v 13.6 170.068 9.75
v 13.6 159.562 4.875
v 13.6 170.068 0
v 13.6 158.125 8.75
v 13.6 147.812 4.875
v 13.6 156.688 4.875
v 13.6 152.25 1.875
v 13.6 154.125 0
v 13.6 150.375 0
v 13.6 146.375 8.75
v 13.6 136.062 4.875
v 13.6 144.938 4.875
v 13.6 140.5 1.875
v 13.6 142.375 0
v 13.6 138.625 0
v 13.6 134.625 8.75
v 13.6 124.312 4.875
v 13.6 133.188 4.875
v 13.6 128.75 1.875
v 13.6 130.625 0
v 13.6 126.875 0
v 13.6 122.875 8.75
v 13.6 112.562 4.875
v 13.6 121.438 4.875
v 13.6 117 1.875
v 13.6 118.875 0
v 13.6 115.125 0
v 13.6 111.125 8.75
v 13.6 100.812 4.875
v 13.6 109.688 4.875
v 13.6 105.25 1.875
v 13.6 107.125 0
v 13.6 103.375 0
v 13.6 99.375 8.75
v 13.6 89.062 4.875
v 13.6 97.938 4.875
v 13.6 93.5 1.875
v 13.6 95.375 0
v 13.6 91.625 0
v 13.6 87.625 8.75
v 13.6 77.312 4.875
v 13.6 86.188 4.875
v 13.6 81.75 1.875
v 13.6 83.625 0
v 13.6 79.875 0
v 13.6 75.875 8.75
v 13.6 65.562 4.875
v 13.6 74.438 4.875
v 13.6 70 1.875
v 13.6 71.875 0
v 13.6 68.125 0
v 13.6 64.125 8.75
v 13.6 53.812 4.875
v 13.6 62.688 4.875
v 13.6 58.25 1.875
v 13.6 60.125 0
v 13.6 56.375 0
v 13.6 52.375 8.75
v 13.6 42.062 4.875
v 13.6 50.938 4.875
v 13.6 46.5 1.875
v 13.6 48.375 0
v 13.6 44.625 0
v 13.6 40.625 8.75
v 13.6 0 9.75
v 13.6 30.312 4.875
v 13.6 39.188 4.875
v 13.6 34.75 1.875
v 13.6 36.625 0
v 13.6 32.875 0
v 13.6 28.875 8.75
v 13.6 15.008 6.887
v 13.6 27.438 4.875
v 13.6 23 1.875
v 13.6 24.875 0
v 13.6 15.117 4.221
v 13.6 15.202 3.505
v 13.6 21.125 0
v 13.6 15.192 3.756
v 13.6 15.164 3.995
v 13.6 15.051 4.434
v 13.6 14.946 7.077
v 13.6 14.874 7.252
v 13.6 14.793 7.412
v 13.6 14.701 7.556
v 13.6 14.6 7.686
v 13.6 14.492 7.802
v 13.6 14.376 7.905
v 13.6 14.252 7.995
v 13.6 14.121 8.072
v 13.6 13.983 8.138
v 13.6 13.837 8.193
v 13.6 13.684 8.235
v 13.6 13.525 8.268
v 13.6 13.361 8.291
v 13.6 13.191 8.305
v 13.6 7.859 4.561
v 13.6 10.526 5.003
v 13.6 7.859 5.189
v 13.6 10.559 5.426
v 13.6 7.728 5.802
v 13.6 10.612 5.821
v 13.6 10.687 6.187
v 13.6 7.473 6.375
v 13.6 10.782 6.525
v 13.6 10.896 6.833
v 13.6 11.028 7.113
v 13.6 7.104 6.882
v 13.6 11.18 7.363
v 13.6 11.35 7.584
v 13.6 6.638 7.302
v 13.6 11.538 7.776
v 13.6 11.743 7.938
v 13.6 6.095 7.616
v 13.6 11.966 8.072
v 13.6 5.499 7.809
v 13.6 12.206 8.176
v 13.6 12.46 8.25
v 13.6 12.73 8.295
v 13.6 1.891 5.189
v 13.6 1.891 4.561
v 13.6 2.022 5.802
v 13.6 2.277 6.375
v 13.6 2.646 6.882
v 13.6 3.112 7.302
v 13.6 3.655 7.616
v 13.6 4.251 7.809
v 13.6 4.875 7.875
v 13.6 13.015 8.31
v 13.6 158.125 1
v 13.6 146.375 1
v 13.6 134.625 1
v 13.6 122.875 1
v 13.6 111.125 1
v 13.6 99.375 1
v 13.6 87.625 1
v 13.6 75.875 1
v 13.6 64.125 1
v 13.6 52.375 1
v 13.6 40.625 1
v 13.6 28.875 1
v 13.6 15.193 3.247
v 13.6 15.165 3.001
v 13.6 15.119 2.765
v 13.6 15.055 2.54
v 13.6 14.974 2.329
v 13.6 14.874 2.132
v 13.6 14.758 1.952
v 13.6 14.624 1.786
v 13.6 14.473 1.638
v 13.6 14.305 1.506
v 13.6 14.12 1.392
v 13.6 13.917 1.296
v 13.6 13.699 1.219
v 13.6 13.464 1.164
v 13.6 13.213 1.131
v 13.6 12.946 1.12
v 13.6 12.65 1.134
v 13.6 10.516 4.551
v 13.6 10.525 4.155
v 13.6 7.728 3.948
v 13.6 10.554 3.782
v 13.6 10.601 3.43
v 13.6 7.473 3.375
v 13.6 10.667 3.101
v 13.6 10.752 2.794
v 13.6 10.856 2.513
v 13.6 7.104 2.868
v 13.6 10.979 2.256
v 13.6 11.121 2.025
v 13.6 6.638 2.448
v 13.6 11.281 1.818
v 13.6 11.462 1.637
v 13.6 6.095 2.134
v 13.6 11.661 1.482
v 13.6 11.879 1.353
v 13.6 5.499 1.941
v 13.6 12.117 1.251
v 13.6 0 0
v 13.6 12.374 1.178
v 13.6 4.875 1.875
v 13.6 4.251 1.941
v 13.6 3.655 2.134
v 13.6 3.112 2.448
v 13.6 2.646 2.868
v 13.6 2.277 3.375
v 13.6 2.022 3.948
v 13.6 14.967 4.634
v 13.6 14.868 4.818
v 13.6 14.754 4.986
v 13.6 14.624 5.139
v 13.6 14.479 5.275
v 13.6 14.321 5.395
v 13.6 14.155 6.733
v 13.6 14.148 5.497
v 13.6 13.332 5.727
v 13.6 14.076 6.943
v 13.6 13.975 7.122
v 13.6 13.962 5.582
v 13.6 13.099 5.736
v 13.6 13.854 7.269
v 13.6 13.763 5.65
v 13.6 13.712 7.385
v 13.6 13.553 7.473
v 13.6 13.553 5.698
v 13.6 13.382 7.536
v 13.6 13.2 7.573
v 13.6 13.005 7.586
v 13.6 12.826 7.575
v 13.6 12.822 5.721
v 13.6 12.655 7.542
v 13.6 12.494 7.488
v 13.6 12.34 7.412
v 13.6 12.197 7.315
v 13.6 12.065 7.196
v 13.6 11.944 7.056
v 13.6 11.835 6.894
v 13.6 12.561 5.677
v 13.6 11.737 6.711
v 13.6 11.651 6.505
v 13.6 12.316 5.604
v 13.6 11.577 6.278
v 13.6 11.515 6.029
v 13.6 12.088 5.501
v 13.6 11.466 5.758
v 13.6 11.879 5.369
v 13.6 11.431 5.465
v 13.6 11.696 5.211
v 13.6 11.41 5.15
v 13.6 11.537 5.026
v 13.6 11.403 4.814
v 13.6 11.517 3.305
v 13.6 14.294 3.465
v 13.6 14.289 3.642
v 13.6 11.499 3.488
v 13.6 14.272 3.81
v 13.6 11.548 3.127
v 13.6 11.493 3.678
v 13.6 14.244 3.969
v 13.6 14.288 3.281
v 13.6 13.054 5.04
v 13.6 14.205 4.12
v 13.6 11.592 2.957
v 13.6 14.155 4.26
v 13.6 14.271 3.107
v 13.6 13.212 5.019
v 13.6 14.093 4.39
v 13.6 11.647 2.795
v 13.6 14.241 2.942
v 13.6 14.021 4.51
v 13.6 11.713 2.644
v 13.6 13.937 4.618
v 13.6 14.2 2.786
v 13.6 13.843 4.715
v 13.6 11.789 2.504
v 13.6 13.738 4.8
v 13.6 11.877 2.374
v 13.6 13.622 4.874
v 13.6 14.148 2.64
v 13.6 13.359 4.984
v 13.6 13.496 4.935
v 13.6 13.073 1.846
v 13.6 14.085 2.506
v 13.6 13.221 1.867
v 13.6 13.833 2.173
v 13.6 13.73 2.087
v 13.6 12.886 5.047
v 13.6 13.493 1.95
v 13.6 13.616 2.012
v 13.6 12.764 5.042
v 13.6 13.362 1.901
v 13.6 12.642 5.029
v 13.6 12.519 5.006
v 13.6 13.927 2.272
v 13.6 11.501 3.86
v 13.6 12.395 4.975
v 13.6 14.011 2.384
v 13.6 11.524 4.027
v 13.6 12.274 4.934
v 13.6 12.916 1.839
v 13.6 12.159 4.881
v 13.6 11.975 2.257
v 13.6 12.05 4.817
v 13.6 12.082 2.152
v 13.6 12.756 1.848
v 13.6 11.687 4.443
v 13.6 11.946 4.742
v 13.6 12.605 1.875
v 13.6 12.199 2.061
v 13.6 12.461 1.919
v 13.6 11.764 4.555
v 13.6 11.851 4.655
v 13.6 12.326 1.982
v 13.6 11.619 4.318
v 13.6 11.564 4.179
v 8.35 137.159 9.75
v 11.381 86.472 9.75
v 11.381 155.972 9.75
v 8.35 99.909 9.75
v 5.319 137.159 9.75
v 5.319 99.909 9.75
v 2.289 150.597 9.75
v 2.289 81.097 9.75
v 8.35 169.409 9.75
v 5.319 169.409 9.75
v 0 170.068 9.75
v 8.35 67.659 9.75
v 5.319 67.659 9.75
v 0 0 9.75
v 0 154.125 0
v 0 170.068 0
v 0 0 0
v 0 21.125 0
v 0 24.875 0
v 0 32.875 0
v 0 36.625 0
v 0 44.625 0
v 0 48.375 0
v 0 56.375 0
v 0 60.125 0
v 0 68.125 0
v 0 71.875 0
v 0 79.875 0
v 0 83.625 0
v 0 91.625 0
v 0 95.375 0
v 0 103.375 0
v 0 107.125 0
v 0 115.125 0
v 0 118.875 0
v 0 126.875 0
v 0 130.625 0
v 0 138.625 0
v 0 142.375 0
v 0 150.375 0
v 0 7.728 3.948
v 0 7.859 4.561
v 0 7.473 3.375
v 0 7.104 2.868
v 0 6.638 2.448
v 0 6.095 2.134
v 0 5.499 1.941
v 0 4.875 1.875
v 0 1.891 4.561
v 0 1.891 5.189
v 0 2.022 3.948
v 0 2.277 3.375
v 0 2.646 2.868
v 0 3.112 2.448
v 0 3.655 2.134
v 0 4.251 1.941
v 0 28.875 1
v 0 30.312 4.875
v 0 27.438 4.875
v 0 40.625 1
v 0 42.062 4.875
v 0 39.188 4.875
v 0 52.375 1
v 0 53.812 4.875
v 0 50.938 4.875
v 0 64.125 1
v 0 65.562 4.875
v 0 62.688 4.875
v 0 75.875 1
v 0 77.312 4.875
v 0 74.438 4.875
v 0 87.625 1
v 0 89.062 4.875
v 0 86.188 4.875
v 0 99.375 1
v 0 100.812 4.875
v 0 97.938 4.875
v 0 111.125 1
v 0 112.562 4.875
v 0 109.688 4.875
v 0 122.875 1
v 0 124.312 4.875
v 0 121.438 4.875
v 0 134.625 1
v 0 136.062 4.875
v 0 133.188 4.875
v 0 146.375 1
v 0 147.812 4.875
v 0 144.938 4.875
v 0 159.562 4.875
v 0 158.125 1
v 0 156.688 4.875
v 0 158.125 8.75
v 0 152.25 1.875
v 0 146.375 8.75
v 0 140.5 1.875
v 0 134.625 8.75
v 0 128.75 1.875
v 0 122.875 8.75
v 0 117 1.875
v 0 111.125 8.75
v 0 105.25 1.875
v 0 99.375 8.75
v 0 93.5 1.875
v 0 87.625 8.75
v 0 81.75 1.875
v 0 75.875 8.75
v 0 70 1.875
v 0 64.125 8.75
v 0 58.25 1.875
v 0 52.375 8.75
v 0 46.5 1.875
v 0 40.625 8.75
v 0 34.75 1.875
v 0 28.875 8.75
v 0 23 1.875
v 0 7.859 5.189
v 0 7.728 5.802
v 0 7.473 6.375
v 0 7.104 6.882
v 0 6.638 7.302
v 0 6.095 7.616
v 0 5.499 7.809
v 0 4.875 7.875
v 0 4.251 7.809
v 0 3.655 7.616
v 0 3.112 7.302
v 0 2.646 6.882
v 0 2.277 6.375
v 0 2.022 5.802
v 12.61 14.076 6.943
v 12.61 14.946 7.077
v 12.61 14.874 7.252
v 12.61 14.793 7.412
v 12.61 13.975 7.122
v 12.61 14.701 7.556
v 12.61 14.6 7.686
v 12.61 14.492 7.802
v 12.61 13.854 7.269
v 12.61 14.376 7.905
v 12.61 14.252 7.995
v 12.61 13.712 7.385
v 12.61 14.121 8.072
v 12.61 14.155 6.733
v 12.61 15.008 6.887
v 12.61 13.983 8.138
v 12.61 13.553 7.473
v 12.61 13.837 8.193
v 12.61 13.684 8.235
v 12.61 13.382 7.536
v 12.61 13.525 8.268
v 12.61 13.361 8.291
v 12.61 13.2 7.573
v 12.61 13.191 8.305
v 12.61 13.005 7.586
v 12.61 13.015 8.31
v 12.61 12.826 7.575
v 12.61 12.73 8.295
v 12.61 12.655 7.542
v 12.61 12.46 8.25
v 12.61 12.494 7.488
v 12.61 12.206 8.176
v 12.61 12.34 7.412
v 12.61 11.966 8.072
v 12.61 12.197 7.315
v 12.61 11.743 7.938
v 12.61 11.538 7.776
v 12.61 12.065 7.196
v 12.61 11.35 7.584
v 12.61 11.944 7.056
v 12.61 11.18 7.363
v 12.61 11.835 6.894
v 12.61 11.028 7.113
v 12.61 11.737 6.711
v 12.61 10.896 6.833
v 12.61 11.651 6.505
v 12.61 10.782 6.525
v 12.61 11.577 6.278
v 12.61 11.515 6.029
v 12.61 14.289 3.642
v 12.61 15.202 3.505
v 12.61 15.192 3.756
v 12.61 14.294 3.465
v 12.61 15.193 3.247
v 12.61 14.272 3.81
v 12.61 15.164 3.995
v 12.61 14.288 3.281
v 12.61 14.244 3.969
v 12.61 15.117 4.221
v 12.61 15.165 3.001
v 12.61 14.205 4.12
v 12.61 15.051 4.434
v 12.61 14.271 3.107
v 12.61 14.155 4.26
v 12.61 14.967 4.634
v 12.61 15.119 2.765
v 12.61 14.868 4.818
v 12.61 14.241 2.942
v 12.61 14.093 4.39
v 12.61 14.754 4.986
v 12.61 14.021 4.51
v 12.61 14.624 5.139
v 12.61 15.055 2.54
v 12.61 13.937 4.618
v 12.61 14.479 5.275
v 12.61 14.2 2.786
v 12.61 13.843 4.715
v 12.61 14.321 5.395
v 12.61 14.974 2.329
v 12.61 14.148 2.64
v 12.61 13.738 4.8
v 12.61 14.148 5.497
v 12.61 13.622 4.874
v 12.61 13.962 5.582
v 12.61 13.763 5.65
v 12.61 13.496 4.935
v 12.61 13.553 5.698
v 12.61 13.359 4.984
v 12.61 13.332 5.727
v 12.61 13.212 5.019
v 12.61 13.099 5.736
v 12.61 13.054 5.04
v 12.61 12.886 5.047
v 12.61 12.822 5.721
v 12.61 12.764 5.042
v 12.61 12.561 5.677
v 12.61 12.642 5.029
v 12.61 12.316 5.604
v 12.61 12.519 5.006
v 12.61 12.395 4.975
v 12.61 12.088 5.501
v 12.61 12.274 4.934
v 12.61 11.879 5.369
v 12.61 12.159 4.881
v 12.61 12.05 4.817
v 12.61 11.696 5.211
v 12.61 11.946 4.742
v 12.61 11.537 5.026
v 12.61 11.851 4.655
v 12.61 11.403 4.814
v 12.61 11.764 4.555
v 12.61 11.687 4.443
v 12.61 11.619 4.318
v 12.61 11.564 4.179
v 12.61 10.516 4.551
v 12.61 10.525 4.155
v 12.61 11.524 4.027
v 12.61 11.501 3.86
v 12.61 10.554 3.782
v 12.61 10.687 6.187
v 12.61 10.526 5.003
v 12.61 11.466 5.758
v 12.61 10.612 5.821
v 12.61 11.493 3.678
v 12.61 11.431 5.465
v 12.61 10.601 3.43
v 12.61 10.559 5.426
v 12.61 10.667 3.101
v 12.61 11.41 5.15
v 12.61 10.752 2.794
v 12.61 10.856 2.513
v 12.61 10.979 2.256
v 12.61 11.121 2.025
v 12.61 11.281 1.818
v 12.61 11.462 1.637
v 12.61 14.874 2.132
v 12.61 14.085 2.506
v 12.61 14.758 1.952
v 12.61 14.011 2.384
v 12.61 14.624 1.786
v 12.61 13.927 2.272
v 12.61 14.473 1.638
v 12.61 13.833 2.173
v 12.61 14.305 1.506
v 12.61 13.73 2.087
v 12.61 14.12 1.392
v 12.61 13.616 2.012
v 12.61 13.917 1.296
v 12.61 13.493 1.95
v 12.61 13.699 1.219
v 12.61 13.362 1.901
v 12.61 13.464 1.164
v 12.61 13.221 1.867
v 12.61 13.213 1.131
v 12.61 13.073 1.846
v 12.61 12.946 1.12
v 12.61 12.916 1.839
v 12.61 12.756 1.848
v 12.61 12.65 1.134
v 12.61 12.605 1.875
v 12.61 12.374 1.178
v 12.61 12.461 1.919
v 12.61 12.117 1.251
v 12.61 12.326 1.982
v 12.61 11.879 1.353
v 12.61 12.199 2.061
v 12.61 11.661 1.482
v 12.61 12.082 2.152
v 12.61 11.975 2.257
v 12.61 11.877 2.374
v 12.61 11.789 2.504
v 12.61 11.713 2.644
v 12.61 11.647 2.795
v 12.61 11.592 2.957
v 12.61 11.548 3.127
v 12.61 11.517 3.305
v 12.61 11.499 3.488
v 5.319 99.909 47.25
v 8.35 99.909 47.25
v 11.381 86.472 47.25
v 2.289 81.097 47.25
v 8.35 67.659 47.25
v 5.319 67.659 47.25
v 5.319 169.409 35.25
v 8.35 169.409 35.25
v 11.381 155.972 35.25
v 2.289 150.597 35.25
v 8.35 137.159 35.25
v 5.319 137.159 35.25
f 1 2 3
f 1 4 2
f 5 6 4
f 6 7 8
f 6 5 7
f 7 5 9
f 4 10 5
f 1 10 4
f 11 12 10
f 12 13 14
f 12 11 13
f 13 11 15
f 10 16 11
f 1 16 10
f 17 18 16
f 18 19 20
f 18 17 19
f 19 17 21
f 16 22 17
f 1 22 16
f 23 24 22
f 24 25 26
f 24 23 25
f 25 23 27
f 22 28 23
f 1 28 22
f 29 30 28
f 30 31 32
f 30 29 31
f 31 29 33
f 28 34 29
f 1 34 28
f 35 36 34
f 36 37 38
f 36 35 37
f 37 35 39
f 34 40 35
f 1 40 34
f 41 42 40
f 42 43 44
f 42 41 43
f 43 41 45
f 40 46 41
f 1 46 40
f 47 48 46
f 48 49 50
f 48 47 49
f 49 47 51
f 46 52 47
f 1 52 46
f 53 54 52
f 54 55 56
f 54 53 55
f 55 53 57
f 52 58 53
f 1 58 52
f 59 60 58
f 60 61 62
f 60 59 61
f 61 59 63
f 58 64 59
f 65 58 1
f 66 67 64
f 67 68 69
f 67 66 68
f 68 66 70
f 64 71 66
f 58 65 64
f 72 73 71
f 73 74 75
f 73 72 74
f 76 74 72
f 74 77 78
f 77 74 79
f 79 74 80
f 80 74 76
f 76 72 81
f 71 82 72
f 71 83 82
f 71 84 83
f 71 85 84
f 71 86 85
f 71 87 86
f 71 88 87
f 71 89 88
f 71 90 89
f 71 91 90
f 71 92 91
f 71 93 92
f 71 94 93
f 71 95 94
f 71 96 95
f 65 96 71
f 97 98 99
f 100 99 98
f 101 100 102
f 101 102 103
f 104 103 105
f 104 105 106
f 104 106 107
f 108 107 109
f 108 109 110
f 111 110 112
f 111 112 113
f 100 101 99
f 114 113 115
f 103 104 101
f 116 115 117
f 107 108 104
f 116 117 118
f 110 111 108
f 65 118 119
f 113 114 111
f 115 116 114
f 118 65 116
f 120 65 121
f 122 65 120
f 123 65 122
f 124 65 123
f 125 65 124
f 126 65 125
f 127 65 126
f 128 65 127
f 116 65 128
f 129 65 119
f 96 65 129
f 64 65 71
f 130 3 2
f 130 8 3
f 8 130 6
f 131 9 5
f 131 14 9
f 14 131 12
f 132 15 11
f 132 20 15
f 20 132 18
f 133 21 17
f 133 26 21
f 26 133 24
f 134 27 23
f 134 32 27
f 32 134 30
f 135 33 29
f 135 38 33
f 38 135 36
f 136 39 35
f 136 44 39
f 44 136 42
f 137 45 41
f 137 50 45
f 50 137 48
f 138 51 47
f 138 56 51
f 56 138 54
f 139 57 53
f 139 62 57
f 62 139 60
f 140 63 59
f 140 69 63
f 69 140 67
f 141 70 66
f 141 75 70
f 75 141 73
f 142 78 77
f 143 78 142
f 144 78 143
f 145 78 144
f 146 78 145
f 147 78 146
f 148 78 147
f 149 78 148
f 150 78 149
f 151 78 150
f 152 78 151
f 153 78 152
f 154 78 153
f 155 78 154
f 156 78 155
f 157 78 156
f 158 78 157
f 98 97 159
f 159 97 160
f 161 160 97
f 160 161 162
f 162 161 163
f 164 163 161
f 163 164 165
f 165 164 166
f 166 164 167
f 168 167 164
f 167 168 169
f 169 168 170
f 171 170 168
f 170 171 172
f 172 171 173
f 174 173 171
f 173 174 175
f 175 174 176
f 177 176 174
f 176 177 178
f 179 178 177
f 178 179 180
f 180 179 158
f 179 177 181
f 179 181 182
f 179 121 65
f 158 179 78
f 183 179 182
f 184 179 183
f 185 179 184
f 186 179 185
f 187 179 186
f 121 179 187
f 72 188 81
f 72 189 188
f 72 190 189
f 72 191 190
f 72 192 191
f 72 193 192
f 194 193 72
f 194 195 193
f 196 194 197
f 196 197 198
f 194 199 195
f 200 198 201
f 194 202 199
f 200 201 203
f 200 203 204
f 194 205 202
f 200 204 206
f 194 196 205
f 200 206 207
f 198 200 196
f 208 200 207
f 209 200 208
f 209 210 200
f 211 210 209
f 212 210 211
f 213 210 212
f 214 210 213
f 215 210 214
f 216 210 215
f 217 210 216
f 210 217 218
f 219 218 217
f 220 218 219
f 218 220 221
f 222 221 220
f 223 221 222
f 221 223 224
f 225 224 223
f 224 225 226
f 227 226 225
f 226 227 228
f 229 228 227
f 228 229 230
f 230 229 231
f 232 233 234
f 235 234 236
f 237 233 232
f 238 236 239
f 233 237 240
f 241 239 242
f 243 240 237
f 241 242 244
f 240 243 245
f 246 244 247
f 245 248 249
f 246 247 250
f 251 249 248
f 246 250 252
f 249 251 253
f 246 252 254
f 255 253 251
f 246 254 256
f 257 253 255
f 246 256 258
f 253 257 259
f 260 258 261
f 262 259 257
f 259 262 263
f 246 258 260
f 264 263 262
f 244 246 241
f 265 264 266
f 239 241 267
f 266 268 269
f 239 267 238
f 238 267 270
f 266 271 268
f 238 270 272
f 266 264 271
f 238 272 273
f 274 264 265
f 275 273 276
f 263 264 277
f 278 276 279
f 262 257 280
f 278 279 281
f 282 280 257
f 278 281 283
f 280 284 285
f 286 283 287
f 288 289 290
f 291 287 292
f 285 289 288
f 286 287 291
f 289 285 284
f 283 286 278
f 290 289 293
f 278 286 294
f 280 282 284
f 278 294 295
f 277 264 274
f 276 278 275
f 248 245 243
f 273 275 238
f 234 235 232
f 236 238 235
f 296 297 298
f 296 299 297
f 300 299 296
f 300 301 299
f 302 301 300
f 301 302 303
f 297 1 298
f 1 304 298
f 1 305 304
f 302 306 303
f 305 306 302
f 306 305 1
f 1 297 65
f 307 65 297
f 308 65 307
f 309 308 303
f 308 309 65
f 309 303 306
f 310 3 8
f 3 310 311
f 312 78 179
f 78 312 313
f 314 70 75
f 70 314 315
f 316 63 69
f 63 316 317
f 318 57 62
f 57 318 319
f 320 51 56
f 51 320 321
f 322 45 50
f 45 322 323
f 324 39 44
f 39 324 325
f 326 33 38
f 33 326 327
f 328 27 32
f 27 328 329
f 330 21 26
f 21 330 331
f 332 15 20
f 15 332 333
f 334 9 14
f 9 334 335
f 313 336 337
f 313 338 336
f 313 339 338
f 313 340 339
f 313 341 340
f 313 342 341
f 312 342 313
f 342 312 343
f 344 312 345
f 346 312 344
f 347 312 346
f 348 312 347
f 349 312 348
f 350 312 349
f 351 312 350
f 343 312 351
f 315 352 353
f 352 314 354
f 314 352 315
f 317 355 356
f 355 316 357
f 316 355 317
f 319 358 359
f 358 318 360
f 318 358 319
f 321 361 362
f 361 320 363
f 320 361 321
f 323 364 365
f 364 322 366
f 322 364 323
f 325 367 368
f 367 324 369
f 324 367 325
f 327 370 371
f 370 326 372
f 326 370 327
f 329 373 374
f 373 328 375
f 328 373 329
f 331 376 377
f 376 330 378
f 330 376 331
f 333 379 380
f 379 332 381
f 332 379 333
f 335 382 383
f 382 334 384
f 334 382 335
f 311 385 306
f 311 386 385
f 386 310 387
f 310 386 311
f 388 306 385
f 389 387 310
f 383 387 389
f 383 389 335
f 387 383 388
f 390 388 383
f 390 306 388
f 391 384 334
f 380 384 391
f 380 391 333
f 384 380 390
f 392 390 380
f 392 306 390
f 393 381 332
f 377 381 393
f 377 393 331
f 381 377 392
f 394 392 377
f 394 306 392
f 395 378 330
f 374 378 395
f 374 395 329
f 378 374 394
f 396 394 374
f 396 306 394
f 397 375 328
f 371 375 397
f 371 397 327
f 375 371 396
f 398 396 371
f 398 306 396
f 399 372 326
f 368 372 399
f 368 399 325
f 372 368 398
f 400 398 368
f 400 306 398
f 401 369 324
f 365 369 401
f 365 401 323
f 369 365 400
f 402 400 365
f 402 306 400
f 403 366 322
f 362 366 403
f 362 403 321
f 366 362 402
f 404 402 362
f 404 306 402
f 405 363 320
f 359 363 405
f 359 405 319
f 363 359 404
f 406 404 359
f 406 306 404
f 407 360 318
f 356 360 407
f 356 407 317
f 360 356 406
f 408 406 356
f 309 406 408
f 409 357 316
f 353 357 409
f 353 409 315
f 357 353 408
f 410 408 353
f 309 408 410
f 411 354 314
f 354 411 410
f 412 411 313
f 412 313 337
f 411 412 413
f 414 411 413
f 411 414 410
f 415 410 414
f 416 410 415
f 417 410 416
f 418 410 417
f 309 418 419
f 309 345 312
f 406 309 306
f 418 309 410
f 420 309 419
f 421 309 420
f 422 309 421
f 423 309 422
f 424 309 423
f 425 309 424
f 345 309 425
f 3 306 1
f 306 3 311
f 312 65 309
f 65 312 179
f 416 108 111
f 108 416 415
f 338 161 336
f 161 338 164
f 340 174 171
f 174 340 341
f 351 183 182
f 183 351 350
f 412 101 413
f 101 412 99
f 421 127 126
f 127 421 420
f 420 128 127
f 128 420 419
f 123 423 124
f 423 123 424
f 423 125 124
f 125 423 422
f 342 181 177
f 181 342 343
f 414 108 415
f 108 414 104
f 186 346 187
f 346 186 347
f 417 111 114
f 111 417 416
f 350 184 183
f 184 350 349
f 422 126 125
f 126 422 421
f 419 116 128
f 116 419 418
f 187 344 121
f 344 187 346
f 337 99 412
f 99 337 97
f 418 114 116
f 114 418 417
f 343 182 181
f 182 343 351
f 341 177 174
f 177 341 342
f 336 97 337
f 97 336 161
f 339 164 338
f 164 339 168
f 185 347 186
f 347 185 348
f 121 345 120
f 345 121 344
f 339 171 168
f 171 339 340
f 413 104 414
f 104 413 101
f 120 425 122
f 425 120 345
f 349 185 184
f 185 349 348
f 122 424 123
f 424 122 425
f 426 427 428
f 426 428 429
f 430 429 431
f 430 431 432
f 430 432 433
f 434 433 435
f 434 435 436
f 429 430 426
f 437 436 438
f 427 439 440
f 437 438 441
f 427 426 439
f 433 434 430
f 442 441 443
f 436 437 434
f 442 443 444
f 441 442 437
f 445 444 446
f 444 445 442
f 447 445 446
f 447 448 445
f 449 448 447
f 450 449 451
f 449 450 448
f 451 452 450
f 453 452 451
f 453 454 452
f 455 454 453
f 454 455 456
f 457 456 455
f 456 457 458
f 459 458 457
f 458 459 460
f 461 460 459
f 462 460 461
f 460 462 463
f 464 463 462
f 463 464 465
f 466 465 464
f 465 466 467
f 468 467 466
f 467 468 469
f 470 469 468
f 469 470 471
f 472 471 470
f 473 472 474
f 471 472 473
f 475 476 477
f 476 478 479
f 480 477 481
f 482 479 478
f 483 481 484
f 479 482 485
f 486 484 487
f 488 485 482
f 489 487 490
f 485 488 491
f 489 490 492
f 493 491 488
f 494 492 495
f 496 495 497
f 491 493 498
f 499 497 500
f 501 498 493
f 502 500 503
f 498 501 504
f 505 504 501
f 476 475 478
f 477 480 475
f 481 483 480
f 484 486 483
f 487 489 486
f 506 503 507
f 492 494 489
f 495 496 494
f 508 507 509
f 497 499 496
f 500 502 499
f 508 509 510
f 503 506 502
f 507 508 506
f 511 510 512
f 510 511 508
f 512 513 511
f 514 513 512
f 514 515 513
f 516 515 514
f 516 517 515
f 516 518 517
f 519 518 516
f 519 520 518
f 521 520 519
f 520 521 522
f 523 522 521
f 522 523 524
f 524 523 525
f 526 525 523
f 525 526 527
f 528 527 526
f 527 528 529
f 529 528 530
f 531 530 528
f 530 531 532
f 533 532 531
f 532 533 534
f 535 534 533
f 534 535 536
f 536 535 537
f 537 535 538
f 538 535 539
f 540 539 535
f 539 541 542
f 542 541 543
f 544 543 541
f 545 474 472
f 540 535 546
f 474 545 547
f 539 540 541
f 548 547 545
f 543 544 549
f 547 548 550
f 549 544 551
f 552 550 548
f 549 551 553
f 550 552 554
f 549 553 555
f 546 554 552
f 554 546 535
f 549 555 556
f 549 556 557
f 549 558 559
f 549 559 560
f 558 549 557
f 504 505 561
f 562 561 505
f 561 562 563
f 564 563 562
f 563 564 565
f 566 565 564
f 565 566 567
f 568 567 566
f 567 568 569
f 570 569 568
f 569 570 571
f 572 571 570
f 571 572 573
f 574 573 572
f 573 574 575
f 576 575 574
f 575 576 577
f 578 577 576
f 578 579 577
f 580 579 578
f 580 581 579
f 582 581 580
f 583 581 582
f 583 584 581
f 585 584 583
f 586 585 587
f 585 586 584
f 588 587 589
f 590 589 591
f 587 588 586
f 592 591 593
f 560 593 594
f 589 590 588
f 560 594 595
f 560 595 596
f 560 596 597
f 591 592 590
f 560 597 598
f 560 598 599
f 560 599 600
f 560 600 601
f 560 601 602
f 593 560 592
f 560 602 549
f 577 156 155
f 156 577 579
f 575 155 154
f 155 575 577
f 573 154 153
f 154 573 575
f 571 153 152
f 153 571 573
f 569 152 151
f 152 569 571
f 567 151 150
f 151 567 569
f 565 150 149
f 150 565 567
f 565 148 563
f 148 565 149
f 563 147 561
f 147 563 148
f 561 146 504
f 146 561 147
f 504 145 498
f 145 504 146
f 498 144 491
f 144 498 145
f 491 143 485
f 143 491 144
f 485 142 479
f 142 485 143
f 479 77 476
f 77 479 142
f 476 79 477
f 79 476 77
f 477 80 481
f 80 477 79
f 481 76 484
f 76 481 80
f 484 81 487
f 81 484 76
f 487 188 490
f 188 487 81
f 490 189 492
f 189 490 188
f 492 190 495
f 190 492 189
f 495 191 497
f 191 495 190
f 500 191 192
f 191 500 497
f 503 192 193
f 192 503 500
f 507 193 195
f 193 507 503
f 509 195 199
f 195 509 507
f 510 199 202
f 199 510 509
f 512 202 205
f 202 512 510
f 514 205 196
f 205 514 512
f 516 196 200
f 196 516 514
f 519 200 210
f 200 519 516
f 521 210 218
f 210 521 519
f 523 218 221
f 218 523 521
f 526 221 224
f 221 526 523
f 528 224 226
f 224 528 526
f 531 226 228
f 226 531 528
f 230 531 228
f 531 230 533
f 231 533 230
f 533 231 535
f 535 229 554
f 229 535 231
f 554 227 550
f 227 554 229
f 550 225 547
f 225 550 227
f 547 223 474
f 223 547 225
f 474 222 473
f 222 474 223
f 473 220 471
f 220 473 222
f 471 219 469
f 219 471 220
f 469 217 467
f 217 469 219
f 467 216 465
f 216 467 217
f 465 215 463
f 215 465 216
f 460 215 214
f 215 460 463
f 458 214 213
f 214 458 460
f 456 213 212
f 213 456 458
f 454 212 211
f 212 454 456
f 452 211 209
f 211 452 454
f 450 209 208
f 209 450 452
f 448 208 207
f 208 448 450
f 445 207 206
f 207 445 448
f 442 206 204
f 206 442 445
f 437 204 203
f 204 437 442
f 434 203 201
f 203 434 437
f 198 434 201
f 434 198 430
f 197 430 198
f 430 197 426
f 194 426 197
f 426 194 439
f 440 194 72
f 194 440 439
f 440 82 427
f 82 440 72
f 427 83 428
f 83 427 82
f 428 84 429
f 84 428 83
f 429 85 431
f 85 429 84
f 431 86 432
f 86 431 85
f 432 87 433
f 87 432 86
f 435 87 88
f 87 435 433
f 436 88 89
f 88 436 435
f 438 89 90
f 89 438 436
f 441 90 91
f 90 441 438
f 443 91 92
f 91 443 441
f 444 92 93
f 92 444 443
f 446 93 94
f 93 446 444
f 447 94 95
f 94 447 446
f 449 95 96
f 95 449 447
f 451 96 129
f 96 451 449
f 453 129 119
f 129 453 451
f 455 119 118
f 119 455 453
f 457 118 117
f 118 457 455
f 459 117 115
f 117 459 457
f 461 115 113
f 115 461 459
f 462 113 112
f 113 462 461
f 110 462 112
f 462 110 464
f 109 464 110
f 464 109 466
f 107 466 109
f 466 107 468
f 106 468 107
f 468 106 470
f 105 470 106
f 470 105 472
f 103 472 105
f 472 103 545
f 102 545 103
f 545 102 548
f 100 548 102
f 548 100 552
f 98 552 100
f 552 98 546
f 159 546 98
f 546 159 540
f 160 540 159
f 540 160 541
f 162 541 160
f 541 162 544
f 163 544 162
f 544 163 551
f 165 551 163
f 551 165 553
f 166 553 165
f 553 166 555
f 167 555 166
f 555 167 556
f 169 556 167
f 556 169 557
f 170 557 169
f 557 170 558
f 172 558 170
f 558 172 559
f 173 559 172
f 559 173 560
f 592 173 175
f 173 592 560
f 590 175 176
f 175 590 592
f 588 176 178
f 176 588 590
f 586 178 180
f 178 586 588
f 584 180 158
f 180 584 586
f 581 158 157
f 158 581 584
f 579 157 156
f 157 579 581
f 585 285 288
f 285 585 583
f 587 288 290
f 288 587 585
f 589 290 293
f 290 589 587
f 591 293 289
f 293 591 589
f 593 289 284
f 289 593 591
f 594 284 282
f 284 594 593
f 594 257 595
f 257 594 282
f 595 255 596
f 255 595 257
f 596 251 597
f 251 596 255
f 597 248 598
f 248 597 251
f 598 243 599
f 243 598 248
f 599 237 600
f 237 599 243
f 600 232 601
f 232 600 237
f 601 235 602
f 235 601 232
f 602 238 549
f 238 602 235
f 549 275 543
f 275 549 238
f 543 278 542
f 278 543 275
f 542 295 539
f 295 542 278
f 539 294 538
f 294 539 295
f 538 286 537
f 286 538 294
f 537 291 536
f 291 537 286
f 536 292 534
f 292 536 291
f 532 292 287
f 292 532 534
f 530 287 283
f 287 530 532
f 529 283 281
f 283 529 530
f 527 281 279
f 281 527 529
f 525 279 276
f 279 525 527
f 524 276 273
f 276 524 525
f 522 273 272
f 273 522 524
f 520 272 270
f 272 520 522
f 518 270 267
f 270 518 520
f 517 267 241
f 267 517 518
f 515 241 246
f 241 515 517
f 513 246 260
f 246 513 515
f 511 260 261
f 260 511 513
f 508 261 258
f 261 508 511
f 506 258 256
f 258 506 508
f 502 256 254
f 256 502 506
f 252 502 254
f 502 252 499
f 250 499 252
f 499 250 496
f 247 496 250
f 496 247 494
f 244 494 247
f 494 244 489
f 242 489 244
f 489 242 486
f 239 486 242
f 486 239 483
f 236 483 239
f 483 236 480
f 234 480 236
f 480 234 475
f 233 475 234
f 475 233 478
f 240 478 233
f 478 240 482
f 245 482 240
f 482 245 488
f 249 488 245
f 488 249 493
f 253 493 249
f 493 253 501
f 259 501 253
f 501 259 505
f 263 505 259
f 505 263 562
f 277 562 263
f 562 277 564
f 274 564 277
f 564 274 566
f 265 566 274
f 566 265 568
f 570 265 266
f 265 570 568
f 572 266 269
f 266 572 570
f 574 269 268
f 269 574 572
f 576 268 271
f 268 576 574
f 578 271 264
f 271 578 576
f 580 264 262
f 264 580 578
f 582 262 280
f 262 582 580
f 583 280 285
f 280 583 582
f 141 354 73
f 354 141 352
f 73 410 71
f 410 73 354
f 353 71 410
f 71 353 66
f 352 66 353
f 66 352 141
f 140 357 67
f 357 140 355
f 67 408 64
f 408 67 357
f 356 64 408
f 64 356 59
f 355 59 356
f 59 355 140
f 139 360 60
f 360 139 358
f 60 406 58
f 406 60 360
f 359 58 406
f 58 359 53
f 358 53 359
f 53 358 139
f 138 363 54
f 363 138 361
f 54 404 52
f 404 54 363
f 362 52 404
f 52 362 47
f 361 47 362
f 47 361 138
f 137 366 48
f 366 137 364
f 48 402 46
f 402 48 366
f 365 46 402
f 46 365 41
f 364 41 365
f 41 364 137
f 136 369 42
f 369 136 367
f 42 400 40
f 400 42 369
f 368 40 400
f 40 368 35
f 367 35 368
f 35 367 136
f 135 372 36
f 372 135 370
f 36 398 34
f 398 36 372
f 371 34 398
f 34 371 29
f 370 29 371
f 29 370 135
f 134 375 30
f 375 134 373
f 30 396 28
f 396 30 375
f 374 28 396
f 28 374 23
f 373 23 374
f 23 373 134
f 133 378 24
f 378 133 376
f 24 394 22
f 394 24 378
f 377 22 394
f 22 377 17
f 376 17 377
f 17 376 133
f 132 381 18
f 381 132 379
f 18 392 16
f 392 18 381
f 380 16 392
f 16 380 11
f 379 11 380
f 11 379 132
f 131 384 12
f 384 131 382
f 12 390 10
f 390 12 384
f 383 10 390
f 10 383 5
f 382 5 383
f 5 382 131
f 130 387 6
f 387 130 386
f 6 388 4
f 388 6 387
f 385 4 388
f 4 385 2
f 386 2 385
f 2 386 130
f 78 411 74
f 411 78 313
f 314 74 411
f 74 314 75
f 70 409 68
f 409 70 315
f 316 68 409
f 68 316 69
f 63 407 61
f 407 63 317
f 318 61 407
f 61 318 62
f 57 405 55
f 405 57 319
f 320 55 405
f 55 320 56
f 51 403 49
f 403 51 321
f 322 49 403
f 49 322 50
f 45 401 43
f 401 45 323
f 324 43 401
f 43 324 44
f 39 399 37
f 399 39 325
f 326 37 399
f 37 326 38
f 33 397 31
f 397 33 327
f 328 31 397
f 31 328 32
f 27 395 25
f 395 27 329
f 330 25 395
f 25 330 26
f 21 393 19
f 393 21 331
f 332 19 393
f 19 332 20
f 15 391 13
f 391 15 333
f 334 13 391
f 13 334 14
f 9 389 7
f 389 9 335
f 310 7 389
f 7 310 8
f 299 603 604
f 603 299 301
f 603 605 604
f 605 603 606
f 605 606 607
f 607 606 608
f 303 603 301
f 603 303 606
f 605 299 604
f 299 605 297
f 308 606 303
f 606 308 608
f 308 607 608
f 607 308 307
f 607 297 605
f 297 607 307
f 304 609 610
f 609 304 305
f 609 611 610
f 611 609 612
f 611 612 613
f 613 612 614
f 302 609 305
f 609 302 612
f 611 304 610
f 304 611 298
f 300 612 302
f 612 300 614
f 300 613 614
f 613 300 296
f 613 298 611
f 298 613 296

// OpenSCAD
// file: values.scad
$fs=0.1;
//Constants:
edgeRadius=1.5;
underKeyWidth=13.6;
baseHeight=9.75;
genh=5.791666666666667;
a=27.423996629776394;
b=12.370392724366756;
c=12.370392724366756;
d=38.393595281686956;
overhead=65.81759191146335;
keyTravelDistance=13.0;
desiredGamut=24;
shift=3.092598181091689;
holeScale=0.5;
stalkScale=0.48;

Points = [
[shift,a,0],//0
[(b-shift),0,0],//1
[(b+shift),0,0],//2
[(b+c-shift),d,0],//3
[(c+shift),(a+d),0],//4
[(c-shift),(a+d),0],//5
[shift,a,keyTravelDistance],//6
[(b-shift),0,keyTravelDistance],//7
[(b+shift),0,keyTravelDistance],//8
[(b+c-shift),d,keyTravelDistance],//9
[(c+shift),(a+d),keyTravelDistance],//10
[(c-shift),(a+d),keyTravelDistance],//11
];
Faces = [
[0,1,2,3,4,5],
[1,0,6,7],
[2,1,7,8],
[3,2,8,9],
[4,3,9,10],
[5,4,10,11],
[0,5,11,6],
[11,10,9,8,7,6] 
];
// file: keytop.scad
include<values.scad>;
keytop();

module keytopShape(){
polyhedron(Points,Faces);
}
module keytop(){
difference(){
keytopShape();
translate([(b+c)/4,(d+a)/4,-0.1])
scale(holeScale,holeScale,holeScale)
keytopShape();
edge(6,11,1,-1);
edge(6,7,1,1);
edge(7,8,1,1);
edge(8,9,1,1);
edge(9,10,1,-1,-1);
edge(10,11,1,-1);
}
module edge (point1,point2,d1,d2,d3=1){
difference(){
translate([Points[point1][0],Points[point1][1],Points[point1][2]])
rotate([0,90,atan((Points[point2][1]-Points[point1][1])/(Points[point2][0]-Points[point1][0]))])
translate([0,0,d3*30])
rotate(45,0,0)
cube([pow(2*(edgeRadius*edgeRadius),1/2),pow(2*(edgeRadius*edgeRadius),1/2),90],true);
translate([Points[point1][0],Points[point1][1],Points[point1][2]])
rotate([0,90,atan((Points[point2][1]-Points[point1][1])/(Points[point2][0]-Points[point1][0]))])
translate([d1*edgeRadius,d2*edgeRadius,d3*30])
cylinder(90,edgeRadius,edgeRadius, true);
}
}

}
// main file
use<keytop.scad>
include<values.scad>
rotate([0,90,0])6_6();
module 6_6(keytops=false){
length=170.06759191146335;
rotate([0,-90,0]){
//Main Base:
difference(){
cube([underKeyWidth,length,baseHeight],false);
translate([-.1,0.5*baseHeight,0.5*baseHeight])rotate([0,90,0])
cylinder((underKeyWidth+.2),r=3, false);
translate([underKeyWidth-.99,10,0.125*baseHeight])
rotate([90,0,90])
linear_extrude(height=1){
text("6",size=baseHeight*0.75);
}

//Warp Cuts:
translate([-1,0.0+25+0.25*baseHeight,baseHeight-1])
rotate([0,90,0])
linear_extrude(height=underKeyWidth+2)
polygon(points=[[0.5*baseHeight-1,0],[baseHeight-2,0.25*baseHeight-1],[0.5*baseHeight-1,0.5*baseHeight-2],[0,0.25*baseHeight-1]]);
translate([-1,11.75+25+0.25*baseHeight,baseHeight-1])
rotate([0,90,0])
linear_extrude(height=underKeyWidth+2)
polygon(points=[[0.5*baseHeight-1,0],[baseHeight-2,0.25*baseHeight-1],[0.5*baseHeight-1,0.5*baseHeight-2],[0,0.25*baseHeight-1]]);
translate([-1,23.5+25+0.25*baseHeight,baseHeight-1])
rotate([0,90,0])
linear_extrude(height=underKeyWidth+2)
polygon(points=[[0.5*baseHeight-1,0],[baseHeight-2,0.25*baseHeight-1],[0.5*baseHeight-1,0.5*baseHeight-2],[0,0.25*baseHeight-1]]);
translate([-1,35.25+25+0.25*baseHeight,baseHeight-1])
rotate([0,90,0])
linear_extrude(height=underKeyWidth+2)
polygon(points=[[0.5*baseHeight-1,0],[baseHeight-2,0.25*baseHeight-1],[0.5*baseHeight-1,0.5*baseHeight-2],[0,0.25*baseHeight-1]]);
translate([-1,47.0+25+0.25*baseHeight,baseHeight-1])
rotate([0,90,0])
linear_extrude(height=underKeyWidth+2)
polygon(points=[[0.5*baseHeight-1,0],[baseHeight-2,0.25*baseHeight-1],[0.5*baseHeight-1,0.5*baseHeight-2],[0,0.25*baseHeight-1]]);
translate([-1,58.75+25+0.25*baseHeight,baseHeight-1])
rotate([0,90,0])
linear_extrude(height=underKeyWidth+2)
polygon(points=[[0.5*baseHeight-1,0],[baseHeight-2,0.25*baseHeight-1],[0.5*baseHeight-1,0.5*baseHeight-2],[0,0.25*baseHeight-1]]);
translate([-1,70.5+25+0.25*baseHeight,baseHeight-1])
rotate([0,90,0])
linear_extrude(height=underKeyWidth+2)
polygon(points=[[0.5*baseHeight-1,0],[baseHeight-2,0.25*baseHeight-1],[0.5*baseHeight-1,0.5*baseHeight-2],[0,0.25*baseHeight-1]]);
translate([-1,82.25+25+0.25*baseHeight,baseHeight-1])
rotate([0,90,0])
linear_extrude(height=underKeyWidth+2)
polygon(points=[[0.5*baseHeight-1,0],[baseHeight-2,0.25*baseHeight-1],[0.5*baseHeight-1,0.5*baseHeight-2],[0,0.25*baseHeight-1]]);
translate([-1,94.0+25+0.25*baseHeight,baseHeight-1])
rotate([0,90,0])
linear_extrude(height=underKeyWidth+2)
polygon(points=[[0.5*baseHeight-1,0],[baseHeight-2,0.25*baseHeight-1],[0.5*baseHeight-1,0.5*baseHeight-2],[0,0.25*baseHeight-1]]);
translate([-1,105.75+25+0.25*baseHeight,baseHeight-1])
rotate([0,90,0])
linear_extrude(height=underKeyWidth+2)
polygon(points=[[0.5*baseHeight-1,0],[baseHeight-2,0.25*baseHeight-1],[0.5*baseHeight-1,0.5*baseHeight-2],[0,0.25*baseHeight-1]]);
translate([-1,117.5+25+0.25*baseHeight,baseHeight-1])
rotate([0,90,0])
linear_extrude(height=underKeyWidth+2)
polygon(points=[[0.5*baseHeight-1,0],[baseHeight-2,0.25*baseHeight-1],[0.5*baseHeight-1,0.5*baseHeight-2],[0,0.25*baseHeight-1]]);
translate([-1,129.25+25+0.25*baseHeight,baseHeight-1])
rotate([0,90,0])
linear_extrude(height=underKeyWidth+2)
polygon(points=[[0.5*baseHeight-1,0],[baseHeight-2,0.25*baseHeight-1],[0.5*baseHeight-1,0.5*baseHeight-2],[0,0.25*baseHeight-1]]);
translate([-1,0.0+25-0.5*baseHeight-1,0.5*baseHeight-3])
rotate([0,90,0])
linear_extrude(height=underKeyWidth+2)
polygon(points=[[0.5*baseHeight-1,0],[baseHeight-2,0.5*baseHeight-1],[0.5*baseHeight-1,baseHeight-2],[0,0.5*baseHeight-1]]);
translate([-1,11.75+25-0.5*baseHeight-1,0.5*baseHeight-3])
rotate([0,90,0])
linear_extrude(height=underKeyWidth+2)
polygon(points=[[0.5*baseHeight-1,0],[baseHeight-2,0.5*baseHeight-1],[0.5*baseHeight-1,baseHeight-2],[0,0.5*baseHeight-1]]);
translate([-1,23.5+25-0.5*baseHeight-1,0.5*baseHeight-3])
rotate([0,90,0])
linear_extrude(height=underKeyWidth+2)
polygon(points=[[0.5*baseHeight-1,0],[baseHeight-2,0.5*baseHeight-1],[0.5*baseHeight-1,baseHeight-2],[0,0.5*baseHeight-1]]);
translate([-1,35.25+25-0.5*baseHeight-1,0.5*baseHeight-3])
rotate([0,90,0])
linear_extrude(height=underKeyWidth+2)
polygon(points=[[0.5*baseHeight-1,0],[baseHeight-2,0.5*baseHeight-1],[0.5*baseHeight-1,baseHeight-2],[0,0.5*baseHeight-1]]);
translate([-1,47.0+25-0.5*baseHeight-1,0.5*baseHeight-3])
rotate([0,90,0])
linear_extrude(height=underKeyWidth+2)
polygon(points=[[0.5*baseHeight-1,0],[baseHeight-2,0.5*baseHeight-1],[0.5*baseHeight-1,baseHeight-2],[0,0.5*baseHeight-1]]);
translate([-1,58.75+25-0.5*baseHeight-1,0.5*baseHeight-3])
rotate([0,90,0])
linear_extrude(height=underKeyWidth+2)
polygon(points=[[0.5*baseHeight-1,0],[baseHeight-2,0.5*baseHeight-1],[0.5*baseHeight-1,baseHeight-2],[0,0.5*baseHeight-1]]);
translate([-1,70.5+25-0.5*baseHeight-1,0.5*baseHeight-3])
rotate([0,90,0])
linear_extrude(height=underKeyWidth+2)
polygon(points=[[0.5*baseHeight-1,0],[baseHeight-2,0.5*baseHeight-1],[0.5*baseHeight-1,baseHeight-2],[0,0.5*baseHeight-1]]);
translate([-1,82.25+25-0.5*baseHeight-1,0.5*baseHeight-3])
rotate([0,90,0])
linear_extrude(height=underKeyWidth+2)
polygon(points=[[0.5*baseHeight-1,0],[baseHeight-2,0.5*baseHeight-1],[0.5*baseHeight-1,baseHeight-2],[0,0.5*baseHeight-1]]);
translate([-1,94.0+25-0.5*baseHeight-1,0.5*baseHeight-3])
rotate([0,90,0])
linear_extrude(height=underKeyWidth+2)
polygon(points=[[0.5*baseHeight-1,0],[baseHeight-2,0.5*baseHeight-1],[0.5*baseHeight-1,baseHeight-2],[0,0.5*baseHeight-1]]);
translate([-1,105.75+25-0.5*baseHeight-1,0.5*baseHeight-3])
rotate([0,90,0])
linear_extrude(height=underKeyWidth+2)
polygon(points=[[0.5*baseHeight-1,0],[baseHeight-2,0.5*baseHeight-1],[0.5*baseHeight-1,baseHeight-2],[0,0.5*baseHeight-1]]);
translate([-1,117.5+25-0.5*baseHeight-1,0.5*baseHeight-3])
rotate([0,90,0])
linear_extrude(height=underKeyWidth+2)
polygon(points=[[0.5*baseHeight-1,0],[baseHeight-2,0.5*baseHeight-1],[0.5*baseHeight-1,baseHeight-2],[0,0.5*baseHeight-1]]);
translate([-1,129.25+25-0.5*baseHeight-1,0.5*baseHeight-3])
rotate([0,90,0])
linear_extrude(height=underKeyWidth+2)
polygon(points=[[0.5*baseHeight-1,0],[baseHeight-2,0.5*baseHeight-1],[0.5*baseHeight-1,baseHeight-2],[0,0.5*baseHeight-1]]);
}
//Key Stalks:
translate([shift/4,(genh*6-(d+a)/2+overhead),baseHeight]){
linear_extrude(height=(keyTravelDistance*1.5+desiredGamut-6)){
scale((stalkScale+holeScale)/2,stalkScale)
polygon(points=[
[Points[0][0],Points[0][1]],[Points[1][0],Points[1][1]],[Points[2][0],Points[2][1]],[Points[3][0],Points[3][1]],[Points[4][0],Points[4][1]],[Points[5][0],Points[5][1]],[Points[6][0],Points[6][1]]
]);
}
if(keytops)
translate([0,(-0.5*(a+d)),(keyTravelDistance*1.5+desiredGamut-6+40)])
keytop();
}
translate([shift/4,(genh*18-(d+a)/2+overhead),baseHeight]){
linear_extrude(height=(keyTravelDistance*1.5+desiredGamut-18)){
scale((stalkScale+holeScale)/2,stalkScale)
polygon(points=[
[Points[0][0],Points[0][1]],[Points[1][0],Points[1][1]],[Points[2][0],Points[2][1]],[Points[3][0],Points[3][1]],[Points[4][0],Points[4][1]],[Points[5][0],Points[5][1]],[Points[6][0],Points[6][1]]
]);
}
if(keytops)
translate([0,(-0.5*(a+d)),(keyTravelDistance*1.5+desiredGamut-18+40)])
keytop();
}
}}
